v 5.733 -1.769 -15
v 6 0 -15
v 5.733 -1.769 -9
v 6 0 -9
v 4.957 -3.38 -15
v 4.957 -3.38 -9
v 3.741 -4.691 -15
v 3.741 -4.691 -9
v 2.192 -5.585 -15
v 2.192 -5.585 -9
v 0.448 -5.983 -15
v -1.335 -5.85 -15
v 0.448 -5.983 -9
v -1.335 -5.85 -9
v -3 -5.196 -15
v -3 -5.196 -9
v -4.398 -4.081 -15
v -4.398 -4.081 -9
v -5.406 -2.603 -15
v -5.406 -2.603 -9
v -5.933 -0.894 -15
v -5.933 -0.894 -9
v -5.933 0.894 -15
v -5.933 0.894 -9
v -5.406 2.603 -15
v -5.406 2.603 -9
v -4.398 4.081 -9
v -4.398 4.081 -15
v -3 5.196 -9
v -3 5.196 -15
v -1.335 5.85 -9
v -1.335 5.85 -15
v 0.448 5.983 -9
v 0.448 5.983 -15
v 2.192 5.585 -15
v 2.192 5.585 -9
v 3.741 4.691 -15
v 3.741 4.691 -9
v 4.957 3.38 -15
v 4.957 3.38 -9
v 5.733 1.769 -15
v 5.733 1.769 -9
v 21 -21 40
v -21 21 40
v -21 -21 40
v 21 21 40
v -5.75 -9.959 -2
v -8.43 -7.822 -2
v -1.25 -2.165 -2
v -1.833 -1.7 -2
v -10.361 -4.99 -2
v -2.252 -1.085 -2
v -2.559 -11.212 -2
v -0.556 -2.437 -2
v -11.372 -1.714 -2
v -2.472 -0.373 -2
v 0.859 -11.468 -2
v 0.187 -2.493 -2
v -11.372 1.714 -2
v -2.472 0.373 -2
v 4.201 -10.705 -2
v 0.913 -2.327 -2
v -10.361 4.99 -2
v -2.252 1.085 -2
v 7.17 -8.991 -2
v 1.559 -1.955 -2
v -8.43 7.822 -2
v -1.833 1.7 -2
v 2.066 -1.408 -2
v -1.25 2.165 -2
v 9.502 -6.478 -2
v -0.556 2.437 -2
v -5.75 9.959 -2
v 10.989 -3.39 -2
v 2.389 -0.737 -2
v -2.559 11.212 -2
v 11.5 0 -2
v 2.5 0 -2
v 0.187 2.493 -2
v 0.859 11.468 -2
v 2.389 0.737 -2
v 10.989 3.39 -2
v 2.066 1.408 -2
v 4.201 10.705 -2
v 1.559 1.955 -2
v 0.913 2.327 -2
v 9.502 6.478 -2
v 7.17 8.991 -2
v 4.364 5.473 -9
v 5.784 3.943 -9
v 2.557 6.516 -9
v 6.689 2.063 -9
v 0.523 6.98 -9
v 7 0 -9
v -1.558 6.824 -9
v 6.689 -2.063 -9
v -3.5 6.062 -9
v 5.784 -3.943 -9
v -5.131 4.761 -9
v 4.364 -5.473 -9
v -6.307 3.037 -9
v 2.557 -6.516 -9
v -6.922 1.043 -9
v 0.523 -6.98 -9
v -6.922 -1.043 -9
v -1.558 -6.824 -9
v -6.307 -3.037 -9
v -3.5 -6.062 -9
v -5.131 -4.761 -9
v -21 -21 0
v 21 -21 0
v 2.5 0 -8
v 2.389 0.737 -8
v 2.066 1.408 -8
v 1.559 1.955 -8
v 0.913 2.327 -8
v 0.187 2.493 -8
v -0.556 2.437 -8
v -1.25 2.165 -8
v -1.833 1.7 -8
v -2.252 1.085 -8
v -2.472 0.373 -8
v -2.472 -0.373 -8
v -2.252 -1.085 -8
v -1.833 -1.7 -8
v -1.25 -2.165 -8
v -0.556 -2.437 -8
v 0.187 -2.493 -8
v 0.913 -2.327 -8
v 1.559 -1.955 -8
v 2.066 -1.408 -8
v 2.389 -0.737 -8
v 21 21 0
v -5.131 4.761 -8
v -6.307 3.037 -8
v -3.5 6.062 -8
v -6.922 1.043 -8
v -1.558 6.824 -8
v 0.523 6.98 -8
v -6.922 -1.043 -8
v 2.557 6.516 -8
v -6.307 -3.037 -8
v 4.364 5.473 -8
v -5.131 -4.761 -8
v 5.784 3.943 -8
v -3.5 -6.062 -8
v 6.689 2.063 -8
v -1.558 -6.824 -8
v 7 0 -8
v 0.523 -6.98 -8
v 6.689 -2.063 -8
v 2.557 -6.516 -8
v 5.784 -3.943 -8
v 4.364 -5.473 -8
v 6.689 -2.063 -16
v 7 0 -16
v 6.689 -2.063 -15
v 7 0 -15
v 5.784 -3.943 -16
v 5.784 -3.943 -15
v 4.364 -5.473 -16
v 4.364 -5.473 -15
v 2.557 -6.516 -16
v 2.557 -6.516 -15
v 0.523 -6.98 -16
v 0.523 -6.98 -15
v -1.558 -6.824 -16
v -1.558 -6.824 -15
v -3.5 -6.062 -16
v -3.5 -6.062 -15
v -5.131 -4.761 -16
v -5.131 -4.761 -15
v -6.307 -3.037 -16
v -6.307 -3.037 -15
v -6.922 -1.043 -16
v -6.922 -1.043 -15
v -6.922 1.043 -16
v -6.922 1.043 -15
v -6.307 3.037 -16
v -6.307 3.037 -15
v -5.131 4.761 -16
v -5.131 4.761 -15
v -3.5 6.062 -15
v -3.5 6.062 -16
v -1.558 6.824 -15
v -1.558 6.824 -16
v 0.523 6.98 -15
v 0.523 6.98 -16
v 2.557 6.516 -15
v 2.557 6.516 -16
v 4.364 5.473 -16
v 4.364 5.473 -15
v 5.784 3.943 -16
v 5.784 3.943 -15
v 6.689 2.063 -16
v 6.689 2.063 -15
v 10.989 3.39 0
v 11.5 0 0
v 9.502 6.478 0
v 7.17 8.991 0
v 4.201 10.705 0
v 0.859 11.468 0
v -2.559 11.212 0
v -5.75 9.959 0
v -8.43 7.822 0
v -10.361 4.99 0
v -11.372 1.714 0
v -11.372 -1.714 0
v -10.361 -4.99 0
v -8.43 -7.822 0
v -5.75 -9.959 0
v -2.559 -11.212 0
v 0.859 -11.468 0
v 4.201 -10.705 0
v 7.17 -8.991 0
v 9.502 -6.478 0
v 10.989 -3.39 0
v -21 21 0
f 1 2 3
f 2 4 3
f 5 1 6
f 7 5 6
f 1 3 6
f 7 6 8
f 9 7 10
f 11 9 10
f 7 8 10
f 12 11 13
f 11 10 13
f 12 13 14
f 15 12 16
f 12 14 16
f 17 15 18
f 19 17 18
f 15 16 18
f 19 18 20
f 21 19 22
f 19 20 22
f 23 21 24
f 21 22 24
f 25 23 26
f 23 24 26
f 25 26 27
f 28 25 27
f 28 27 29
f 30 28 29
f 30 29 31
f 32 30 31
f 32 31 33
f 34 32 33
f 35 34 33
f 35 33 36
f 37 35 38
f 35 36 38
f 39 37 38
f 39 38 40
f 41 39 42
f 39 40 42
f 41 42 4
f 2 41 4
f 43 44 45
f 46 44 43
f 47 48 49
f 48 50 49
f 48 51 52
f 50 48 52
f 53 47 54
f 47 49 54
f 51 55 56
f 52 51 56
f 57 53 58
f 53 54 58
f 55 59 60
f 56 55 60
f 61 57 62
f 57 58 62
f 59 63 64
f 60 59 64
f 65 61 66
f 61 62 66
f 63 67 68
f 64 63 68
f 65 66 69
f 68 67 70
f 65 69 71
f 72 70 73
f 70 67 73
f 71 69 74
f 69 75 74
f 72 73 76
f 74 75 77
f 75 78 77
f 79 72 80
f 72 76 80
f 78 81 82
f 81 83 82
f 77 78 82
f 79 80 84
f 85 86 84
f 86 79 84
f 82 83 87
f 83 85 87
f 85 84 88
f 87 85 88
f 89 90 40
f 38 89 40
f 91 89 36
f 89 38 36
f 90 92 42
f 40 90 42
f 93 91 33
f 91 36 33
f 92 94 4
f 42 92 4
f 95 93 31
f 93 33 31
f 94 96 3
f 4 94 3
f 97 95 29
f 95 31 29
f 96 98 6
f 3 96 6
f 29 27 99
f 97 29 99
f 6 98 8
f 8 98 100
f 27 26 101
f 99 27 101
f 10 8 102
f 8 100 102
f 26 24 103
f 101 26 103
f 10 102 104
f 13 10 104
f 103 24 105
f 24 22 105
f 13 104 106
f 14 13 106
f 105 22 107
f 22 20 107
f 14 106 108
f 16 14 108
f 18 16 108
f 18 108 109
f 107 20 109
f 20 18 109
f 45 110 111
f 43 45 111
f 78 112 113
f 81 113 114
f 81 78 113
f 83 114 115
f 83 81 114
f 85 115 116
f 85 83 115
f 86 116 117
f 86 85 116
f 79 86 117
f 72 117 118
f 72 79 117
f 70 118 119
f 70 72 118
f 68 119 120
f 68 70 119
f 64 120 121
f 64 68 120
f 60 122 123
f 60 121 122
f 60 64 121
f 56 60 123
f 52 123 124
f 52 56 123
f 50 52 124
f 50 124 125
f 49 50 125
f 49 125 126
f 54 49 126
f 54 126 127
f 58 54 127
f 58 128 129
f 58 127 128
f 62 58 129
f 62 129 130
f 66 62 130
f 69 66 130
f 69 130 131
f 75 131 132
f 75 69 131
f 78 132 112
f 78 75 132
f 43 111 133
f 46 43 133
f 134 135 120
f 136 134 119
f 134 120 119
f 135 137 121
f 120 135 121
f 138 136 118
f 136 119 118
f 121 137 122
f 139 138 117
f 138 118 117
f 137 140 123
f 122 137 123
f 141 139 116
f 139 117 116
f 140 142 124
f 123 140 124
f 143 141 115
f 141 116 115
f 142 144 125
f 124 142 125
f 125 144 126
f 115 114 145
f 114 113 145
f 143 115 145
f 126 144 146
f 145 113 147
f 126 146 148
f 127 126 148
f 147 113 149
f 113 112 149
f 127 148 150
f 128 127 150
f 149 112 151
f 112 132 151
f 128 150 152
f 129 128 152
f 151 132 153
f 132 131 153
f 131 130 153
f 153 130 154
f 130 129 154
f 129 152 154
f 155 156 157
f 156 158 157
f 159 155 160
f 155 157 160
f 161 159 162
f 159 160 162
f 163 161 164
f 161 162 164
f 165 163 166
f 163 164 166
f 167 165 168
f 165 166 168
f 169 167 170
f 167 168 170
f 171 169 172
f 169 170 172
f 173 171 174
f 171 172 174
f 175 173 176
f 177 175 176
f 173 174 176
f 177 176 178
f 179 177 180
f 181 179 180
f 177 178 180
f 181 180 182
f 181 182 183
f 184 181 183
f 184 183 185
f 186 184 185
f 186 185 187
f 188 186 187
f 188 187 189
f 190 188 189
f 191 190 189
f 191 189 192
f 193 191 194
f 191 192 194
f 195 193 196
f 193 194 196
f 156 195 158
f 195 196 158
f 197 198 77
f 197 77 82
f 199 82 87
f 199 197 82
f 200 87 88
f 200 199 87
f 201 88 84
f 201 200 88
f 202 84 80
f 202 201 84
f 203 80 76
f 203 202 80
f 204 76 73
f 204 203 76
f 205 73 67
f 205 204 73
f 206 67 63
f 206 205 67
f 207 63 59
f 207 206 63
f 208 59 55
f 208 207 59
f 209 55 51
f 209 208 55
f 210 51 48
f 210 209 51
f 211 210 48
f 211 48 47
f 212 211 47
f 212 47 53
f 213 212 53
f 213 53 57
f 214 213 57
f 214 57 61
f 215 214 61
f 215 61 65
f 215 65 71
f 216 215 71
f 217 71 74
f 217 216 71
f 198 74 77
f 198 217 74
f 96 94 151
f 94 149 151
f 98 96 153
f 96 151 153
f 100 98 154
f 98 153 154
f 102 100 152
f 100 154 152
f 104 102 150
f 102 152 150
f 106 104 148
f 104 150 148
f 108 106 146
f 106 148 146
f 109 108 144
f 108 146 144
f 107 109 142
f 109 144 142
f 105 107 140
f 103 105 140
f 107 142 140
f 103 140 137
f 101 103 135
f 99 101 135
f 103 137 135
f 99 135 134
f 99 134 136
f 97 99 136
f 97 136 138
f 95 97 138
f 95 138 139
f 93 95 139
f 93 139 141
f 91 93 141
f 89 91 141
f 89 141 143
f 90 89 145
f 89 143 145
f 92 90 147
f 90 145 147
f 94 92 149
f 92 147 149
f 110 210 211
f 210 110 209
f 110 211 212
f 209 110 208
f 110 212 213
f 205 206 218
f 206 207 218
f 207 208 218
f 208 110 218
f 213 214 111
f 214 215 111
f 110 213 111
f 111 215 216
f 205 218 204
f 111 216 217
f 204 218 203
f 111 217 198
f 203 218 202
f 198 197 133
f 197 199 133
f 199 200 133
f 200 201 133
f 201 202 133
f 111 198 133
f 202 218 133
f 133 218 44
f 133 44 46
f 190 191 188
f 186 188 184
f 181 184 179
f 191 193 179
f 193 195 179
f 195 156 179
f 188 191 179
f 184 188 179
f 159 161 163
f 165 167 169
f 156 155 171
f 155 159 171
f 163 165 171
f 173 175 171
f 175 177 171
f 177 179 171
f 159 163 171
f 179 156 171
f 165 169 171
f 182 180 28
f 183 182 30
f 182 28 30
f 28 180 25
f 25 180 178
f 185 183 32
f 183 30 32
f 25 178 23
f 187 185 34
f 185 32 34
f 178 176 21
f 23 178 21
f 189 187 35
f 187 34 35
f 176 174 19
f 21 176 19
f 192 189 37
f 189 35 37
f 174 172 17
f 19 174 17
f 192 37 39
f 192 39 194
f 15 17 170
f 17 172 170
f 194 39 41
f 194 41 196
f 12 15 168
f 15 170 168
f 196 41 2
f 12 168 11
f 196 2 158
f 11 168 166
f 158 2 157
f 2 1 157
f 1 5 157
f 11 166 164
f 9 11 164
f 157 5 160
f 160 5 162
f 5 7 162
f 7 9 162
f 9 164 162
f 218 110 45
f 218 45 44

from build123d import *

# Parameters (mm, degrees)
SKETCH_1_W      = 42
SKETCH_1_H      = 42
EXTRUDE_1_DEPTH = 40
SKETCH_1_3_R    = 11.5
EXTRUDE_2_DEPTH = 2
SKETCH_1_4_R    = 2.5
EXTRUDE_3_DEPTH = 16


with BuildPart() as part:
    # 草图1 → 凸台-拉伸1 (new body)
    with BuildSketch(Plane.XY):
        Rectangle(SKETCH_1_W, SKETCH_1_H)
    extrude(amount=EXTRUDE_1_DEPTH)

    # 草图1<3> → 凸台-拉伸2 (add)
    with BuildSketch(Plane.XY):
        Circle(SKETCH_1_3_R)
    extrude(amount=-EXTRUDE_2_DEPTH)

    # 草图1<4> → 凸台-拉伸3 (add)
    with BuildSketch(Plane.XY):
        Circle(SKETCH_1_4_R)
    extrude(amount=-EXTRUDE_3_DEPTH)

    # 草图2 → 旋转1 (revolve)
    with BuildSketch(Plane(origin=(0, 0, 0), x_dir=(1, 0, 0), z_dir=(0, 1, 0))):
        Polygon((2.5, 16), (7, 16), (7, 15), (6, 15), (6, 9), (7, 9), (7, 8), (2.5, 8), align=None)
    revolve(axis=Axis((0, 0, 1000), (0, 0, -1)))


solid = part.part
